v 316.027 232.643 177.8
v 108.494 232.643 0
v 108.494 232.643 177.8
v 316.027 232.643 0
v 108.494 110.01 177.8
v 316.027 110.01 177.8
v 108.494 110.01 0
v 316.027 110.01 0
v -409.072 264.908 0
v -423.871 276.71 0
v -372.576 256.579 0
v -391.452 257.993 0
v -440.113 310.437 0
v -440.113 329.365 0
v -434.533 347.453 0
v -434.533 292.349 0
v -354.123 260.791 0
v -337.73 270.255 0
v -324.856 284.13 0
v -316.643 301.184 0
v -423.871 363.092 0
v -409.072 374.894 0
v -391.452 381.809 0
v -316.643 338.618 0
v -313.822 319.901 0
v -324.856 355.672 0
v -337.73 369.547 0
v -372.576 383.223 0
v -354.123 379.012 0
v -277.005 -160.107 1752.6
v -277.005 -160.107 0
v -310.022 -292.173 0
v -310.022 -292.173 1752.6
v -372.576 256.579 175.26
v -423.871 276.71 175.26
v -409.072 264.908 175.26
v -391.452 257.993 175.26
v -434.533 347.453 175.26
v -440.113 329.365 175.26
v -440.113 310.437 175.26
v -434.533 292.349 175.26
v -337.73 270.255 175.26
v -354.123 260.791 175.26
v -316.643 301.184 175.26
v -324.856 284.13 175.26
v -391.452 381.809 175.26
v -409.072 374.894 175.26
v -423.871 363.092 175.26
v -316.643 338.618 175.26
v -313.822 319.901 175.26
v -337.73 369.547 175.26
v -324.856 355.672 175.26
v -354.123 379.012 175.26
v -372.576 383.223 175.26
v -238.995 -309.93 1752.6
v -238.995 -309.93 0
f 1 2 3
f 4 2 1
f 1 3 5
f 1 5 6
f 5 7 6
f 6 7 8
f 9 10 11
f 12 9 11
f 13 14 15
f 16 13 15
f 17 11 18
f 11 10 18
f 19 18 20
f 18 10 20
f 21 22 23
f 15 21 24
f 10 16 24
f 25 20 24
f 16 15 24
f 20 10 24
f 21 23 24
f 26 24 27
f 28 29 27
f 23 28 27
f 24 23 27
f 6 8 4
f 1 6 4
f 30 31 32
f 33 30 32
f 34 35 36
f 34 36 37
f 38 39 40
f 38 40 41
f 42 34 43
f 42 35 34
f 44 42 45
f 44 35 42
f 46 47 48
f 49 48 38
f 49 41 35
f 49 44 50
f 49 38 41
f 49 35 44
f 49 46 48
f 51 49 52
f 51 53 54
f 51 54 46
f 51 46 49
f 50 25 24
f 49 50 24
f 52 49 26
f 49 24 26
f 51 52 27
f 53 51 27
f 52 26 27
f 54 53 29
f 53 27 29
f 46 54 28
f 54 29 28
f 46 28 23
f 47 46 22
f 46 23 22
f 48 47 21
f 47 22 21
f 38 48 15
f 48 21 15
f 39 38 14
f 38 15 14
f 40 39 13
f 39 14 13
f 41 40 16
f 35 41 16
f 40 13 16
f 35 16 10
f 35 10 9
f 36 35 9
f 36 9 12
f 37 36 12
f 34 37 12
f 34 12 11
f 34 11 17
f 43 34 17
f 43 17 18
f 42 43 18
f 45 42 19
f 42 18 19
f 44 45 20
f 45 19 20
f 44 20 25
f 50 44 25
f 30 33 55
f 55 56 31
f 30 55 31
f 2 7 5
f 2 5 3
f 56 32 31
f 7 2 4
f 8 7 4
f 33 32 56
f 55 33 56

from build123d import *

# Parameters (mm, degrees)
F0_R     = 63.5
F1_DEPTH = 175.26
F0_W     = 207.533106
F0_H     = 122.63321
F2_DEPTH = 177.8
F3_DEPTH = 1752.6


with BuildPart() as f1:
    # F0 (on Top) → F1 (new body)
    with BuildSketch(Plane.XY):
        with Locations((-377.321816, 319.901043)):
            Circle(F0_R)
    extrude(amount=F1_DEPTH)


with BuildPart() as f2:
    # F0 (on Top) → F2 (new body)
    with BuildSketch(Plane.XY):
        with Locations((212.260927, 171.326202)):
            Rectangle(F0_W, F0_H)
    extrude(amount=F2_DEPTH)


with BuildPart() as f3:
    # F0 (on Top) → F3 (new body)
    with BuildSketch(Plane.XY):
        Polygon((-238.994548, -309.930128), (-277.005283, -160.106761), (-310.021927, -292.173275), align=None)
    extrude(amount=F3_DEPTH)


solid = Compound([f1.part, f2.part, f3.part])
